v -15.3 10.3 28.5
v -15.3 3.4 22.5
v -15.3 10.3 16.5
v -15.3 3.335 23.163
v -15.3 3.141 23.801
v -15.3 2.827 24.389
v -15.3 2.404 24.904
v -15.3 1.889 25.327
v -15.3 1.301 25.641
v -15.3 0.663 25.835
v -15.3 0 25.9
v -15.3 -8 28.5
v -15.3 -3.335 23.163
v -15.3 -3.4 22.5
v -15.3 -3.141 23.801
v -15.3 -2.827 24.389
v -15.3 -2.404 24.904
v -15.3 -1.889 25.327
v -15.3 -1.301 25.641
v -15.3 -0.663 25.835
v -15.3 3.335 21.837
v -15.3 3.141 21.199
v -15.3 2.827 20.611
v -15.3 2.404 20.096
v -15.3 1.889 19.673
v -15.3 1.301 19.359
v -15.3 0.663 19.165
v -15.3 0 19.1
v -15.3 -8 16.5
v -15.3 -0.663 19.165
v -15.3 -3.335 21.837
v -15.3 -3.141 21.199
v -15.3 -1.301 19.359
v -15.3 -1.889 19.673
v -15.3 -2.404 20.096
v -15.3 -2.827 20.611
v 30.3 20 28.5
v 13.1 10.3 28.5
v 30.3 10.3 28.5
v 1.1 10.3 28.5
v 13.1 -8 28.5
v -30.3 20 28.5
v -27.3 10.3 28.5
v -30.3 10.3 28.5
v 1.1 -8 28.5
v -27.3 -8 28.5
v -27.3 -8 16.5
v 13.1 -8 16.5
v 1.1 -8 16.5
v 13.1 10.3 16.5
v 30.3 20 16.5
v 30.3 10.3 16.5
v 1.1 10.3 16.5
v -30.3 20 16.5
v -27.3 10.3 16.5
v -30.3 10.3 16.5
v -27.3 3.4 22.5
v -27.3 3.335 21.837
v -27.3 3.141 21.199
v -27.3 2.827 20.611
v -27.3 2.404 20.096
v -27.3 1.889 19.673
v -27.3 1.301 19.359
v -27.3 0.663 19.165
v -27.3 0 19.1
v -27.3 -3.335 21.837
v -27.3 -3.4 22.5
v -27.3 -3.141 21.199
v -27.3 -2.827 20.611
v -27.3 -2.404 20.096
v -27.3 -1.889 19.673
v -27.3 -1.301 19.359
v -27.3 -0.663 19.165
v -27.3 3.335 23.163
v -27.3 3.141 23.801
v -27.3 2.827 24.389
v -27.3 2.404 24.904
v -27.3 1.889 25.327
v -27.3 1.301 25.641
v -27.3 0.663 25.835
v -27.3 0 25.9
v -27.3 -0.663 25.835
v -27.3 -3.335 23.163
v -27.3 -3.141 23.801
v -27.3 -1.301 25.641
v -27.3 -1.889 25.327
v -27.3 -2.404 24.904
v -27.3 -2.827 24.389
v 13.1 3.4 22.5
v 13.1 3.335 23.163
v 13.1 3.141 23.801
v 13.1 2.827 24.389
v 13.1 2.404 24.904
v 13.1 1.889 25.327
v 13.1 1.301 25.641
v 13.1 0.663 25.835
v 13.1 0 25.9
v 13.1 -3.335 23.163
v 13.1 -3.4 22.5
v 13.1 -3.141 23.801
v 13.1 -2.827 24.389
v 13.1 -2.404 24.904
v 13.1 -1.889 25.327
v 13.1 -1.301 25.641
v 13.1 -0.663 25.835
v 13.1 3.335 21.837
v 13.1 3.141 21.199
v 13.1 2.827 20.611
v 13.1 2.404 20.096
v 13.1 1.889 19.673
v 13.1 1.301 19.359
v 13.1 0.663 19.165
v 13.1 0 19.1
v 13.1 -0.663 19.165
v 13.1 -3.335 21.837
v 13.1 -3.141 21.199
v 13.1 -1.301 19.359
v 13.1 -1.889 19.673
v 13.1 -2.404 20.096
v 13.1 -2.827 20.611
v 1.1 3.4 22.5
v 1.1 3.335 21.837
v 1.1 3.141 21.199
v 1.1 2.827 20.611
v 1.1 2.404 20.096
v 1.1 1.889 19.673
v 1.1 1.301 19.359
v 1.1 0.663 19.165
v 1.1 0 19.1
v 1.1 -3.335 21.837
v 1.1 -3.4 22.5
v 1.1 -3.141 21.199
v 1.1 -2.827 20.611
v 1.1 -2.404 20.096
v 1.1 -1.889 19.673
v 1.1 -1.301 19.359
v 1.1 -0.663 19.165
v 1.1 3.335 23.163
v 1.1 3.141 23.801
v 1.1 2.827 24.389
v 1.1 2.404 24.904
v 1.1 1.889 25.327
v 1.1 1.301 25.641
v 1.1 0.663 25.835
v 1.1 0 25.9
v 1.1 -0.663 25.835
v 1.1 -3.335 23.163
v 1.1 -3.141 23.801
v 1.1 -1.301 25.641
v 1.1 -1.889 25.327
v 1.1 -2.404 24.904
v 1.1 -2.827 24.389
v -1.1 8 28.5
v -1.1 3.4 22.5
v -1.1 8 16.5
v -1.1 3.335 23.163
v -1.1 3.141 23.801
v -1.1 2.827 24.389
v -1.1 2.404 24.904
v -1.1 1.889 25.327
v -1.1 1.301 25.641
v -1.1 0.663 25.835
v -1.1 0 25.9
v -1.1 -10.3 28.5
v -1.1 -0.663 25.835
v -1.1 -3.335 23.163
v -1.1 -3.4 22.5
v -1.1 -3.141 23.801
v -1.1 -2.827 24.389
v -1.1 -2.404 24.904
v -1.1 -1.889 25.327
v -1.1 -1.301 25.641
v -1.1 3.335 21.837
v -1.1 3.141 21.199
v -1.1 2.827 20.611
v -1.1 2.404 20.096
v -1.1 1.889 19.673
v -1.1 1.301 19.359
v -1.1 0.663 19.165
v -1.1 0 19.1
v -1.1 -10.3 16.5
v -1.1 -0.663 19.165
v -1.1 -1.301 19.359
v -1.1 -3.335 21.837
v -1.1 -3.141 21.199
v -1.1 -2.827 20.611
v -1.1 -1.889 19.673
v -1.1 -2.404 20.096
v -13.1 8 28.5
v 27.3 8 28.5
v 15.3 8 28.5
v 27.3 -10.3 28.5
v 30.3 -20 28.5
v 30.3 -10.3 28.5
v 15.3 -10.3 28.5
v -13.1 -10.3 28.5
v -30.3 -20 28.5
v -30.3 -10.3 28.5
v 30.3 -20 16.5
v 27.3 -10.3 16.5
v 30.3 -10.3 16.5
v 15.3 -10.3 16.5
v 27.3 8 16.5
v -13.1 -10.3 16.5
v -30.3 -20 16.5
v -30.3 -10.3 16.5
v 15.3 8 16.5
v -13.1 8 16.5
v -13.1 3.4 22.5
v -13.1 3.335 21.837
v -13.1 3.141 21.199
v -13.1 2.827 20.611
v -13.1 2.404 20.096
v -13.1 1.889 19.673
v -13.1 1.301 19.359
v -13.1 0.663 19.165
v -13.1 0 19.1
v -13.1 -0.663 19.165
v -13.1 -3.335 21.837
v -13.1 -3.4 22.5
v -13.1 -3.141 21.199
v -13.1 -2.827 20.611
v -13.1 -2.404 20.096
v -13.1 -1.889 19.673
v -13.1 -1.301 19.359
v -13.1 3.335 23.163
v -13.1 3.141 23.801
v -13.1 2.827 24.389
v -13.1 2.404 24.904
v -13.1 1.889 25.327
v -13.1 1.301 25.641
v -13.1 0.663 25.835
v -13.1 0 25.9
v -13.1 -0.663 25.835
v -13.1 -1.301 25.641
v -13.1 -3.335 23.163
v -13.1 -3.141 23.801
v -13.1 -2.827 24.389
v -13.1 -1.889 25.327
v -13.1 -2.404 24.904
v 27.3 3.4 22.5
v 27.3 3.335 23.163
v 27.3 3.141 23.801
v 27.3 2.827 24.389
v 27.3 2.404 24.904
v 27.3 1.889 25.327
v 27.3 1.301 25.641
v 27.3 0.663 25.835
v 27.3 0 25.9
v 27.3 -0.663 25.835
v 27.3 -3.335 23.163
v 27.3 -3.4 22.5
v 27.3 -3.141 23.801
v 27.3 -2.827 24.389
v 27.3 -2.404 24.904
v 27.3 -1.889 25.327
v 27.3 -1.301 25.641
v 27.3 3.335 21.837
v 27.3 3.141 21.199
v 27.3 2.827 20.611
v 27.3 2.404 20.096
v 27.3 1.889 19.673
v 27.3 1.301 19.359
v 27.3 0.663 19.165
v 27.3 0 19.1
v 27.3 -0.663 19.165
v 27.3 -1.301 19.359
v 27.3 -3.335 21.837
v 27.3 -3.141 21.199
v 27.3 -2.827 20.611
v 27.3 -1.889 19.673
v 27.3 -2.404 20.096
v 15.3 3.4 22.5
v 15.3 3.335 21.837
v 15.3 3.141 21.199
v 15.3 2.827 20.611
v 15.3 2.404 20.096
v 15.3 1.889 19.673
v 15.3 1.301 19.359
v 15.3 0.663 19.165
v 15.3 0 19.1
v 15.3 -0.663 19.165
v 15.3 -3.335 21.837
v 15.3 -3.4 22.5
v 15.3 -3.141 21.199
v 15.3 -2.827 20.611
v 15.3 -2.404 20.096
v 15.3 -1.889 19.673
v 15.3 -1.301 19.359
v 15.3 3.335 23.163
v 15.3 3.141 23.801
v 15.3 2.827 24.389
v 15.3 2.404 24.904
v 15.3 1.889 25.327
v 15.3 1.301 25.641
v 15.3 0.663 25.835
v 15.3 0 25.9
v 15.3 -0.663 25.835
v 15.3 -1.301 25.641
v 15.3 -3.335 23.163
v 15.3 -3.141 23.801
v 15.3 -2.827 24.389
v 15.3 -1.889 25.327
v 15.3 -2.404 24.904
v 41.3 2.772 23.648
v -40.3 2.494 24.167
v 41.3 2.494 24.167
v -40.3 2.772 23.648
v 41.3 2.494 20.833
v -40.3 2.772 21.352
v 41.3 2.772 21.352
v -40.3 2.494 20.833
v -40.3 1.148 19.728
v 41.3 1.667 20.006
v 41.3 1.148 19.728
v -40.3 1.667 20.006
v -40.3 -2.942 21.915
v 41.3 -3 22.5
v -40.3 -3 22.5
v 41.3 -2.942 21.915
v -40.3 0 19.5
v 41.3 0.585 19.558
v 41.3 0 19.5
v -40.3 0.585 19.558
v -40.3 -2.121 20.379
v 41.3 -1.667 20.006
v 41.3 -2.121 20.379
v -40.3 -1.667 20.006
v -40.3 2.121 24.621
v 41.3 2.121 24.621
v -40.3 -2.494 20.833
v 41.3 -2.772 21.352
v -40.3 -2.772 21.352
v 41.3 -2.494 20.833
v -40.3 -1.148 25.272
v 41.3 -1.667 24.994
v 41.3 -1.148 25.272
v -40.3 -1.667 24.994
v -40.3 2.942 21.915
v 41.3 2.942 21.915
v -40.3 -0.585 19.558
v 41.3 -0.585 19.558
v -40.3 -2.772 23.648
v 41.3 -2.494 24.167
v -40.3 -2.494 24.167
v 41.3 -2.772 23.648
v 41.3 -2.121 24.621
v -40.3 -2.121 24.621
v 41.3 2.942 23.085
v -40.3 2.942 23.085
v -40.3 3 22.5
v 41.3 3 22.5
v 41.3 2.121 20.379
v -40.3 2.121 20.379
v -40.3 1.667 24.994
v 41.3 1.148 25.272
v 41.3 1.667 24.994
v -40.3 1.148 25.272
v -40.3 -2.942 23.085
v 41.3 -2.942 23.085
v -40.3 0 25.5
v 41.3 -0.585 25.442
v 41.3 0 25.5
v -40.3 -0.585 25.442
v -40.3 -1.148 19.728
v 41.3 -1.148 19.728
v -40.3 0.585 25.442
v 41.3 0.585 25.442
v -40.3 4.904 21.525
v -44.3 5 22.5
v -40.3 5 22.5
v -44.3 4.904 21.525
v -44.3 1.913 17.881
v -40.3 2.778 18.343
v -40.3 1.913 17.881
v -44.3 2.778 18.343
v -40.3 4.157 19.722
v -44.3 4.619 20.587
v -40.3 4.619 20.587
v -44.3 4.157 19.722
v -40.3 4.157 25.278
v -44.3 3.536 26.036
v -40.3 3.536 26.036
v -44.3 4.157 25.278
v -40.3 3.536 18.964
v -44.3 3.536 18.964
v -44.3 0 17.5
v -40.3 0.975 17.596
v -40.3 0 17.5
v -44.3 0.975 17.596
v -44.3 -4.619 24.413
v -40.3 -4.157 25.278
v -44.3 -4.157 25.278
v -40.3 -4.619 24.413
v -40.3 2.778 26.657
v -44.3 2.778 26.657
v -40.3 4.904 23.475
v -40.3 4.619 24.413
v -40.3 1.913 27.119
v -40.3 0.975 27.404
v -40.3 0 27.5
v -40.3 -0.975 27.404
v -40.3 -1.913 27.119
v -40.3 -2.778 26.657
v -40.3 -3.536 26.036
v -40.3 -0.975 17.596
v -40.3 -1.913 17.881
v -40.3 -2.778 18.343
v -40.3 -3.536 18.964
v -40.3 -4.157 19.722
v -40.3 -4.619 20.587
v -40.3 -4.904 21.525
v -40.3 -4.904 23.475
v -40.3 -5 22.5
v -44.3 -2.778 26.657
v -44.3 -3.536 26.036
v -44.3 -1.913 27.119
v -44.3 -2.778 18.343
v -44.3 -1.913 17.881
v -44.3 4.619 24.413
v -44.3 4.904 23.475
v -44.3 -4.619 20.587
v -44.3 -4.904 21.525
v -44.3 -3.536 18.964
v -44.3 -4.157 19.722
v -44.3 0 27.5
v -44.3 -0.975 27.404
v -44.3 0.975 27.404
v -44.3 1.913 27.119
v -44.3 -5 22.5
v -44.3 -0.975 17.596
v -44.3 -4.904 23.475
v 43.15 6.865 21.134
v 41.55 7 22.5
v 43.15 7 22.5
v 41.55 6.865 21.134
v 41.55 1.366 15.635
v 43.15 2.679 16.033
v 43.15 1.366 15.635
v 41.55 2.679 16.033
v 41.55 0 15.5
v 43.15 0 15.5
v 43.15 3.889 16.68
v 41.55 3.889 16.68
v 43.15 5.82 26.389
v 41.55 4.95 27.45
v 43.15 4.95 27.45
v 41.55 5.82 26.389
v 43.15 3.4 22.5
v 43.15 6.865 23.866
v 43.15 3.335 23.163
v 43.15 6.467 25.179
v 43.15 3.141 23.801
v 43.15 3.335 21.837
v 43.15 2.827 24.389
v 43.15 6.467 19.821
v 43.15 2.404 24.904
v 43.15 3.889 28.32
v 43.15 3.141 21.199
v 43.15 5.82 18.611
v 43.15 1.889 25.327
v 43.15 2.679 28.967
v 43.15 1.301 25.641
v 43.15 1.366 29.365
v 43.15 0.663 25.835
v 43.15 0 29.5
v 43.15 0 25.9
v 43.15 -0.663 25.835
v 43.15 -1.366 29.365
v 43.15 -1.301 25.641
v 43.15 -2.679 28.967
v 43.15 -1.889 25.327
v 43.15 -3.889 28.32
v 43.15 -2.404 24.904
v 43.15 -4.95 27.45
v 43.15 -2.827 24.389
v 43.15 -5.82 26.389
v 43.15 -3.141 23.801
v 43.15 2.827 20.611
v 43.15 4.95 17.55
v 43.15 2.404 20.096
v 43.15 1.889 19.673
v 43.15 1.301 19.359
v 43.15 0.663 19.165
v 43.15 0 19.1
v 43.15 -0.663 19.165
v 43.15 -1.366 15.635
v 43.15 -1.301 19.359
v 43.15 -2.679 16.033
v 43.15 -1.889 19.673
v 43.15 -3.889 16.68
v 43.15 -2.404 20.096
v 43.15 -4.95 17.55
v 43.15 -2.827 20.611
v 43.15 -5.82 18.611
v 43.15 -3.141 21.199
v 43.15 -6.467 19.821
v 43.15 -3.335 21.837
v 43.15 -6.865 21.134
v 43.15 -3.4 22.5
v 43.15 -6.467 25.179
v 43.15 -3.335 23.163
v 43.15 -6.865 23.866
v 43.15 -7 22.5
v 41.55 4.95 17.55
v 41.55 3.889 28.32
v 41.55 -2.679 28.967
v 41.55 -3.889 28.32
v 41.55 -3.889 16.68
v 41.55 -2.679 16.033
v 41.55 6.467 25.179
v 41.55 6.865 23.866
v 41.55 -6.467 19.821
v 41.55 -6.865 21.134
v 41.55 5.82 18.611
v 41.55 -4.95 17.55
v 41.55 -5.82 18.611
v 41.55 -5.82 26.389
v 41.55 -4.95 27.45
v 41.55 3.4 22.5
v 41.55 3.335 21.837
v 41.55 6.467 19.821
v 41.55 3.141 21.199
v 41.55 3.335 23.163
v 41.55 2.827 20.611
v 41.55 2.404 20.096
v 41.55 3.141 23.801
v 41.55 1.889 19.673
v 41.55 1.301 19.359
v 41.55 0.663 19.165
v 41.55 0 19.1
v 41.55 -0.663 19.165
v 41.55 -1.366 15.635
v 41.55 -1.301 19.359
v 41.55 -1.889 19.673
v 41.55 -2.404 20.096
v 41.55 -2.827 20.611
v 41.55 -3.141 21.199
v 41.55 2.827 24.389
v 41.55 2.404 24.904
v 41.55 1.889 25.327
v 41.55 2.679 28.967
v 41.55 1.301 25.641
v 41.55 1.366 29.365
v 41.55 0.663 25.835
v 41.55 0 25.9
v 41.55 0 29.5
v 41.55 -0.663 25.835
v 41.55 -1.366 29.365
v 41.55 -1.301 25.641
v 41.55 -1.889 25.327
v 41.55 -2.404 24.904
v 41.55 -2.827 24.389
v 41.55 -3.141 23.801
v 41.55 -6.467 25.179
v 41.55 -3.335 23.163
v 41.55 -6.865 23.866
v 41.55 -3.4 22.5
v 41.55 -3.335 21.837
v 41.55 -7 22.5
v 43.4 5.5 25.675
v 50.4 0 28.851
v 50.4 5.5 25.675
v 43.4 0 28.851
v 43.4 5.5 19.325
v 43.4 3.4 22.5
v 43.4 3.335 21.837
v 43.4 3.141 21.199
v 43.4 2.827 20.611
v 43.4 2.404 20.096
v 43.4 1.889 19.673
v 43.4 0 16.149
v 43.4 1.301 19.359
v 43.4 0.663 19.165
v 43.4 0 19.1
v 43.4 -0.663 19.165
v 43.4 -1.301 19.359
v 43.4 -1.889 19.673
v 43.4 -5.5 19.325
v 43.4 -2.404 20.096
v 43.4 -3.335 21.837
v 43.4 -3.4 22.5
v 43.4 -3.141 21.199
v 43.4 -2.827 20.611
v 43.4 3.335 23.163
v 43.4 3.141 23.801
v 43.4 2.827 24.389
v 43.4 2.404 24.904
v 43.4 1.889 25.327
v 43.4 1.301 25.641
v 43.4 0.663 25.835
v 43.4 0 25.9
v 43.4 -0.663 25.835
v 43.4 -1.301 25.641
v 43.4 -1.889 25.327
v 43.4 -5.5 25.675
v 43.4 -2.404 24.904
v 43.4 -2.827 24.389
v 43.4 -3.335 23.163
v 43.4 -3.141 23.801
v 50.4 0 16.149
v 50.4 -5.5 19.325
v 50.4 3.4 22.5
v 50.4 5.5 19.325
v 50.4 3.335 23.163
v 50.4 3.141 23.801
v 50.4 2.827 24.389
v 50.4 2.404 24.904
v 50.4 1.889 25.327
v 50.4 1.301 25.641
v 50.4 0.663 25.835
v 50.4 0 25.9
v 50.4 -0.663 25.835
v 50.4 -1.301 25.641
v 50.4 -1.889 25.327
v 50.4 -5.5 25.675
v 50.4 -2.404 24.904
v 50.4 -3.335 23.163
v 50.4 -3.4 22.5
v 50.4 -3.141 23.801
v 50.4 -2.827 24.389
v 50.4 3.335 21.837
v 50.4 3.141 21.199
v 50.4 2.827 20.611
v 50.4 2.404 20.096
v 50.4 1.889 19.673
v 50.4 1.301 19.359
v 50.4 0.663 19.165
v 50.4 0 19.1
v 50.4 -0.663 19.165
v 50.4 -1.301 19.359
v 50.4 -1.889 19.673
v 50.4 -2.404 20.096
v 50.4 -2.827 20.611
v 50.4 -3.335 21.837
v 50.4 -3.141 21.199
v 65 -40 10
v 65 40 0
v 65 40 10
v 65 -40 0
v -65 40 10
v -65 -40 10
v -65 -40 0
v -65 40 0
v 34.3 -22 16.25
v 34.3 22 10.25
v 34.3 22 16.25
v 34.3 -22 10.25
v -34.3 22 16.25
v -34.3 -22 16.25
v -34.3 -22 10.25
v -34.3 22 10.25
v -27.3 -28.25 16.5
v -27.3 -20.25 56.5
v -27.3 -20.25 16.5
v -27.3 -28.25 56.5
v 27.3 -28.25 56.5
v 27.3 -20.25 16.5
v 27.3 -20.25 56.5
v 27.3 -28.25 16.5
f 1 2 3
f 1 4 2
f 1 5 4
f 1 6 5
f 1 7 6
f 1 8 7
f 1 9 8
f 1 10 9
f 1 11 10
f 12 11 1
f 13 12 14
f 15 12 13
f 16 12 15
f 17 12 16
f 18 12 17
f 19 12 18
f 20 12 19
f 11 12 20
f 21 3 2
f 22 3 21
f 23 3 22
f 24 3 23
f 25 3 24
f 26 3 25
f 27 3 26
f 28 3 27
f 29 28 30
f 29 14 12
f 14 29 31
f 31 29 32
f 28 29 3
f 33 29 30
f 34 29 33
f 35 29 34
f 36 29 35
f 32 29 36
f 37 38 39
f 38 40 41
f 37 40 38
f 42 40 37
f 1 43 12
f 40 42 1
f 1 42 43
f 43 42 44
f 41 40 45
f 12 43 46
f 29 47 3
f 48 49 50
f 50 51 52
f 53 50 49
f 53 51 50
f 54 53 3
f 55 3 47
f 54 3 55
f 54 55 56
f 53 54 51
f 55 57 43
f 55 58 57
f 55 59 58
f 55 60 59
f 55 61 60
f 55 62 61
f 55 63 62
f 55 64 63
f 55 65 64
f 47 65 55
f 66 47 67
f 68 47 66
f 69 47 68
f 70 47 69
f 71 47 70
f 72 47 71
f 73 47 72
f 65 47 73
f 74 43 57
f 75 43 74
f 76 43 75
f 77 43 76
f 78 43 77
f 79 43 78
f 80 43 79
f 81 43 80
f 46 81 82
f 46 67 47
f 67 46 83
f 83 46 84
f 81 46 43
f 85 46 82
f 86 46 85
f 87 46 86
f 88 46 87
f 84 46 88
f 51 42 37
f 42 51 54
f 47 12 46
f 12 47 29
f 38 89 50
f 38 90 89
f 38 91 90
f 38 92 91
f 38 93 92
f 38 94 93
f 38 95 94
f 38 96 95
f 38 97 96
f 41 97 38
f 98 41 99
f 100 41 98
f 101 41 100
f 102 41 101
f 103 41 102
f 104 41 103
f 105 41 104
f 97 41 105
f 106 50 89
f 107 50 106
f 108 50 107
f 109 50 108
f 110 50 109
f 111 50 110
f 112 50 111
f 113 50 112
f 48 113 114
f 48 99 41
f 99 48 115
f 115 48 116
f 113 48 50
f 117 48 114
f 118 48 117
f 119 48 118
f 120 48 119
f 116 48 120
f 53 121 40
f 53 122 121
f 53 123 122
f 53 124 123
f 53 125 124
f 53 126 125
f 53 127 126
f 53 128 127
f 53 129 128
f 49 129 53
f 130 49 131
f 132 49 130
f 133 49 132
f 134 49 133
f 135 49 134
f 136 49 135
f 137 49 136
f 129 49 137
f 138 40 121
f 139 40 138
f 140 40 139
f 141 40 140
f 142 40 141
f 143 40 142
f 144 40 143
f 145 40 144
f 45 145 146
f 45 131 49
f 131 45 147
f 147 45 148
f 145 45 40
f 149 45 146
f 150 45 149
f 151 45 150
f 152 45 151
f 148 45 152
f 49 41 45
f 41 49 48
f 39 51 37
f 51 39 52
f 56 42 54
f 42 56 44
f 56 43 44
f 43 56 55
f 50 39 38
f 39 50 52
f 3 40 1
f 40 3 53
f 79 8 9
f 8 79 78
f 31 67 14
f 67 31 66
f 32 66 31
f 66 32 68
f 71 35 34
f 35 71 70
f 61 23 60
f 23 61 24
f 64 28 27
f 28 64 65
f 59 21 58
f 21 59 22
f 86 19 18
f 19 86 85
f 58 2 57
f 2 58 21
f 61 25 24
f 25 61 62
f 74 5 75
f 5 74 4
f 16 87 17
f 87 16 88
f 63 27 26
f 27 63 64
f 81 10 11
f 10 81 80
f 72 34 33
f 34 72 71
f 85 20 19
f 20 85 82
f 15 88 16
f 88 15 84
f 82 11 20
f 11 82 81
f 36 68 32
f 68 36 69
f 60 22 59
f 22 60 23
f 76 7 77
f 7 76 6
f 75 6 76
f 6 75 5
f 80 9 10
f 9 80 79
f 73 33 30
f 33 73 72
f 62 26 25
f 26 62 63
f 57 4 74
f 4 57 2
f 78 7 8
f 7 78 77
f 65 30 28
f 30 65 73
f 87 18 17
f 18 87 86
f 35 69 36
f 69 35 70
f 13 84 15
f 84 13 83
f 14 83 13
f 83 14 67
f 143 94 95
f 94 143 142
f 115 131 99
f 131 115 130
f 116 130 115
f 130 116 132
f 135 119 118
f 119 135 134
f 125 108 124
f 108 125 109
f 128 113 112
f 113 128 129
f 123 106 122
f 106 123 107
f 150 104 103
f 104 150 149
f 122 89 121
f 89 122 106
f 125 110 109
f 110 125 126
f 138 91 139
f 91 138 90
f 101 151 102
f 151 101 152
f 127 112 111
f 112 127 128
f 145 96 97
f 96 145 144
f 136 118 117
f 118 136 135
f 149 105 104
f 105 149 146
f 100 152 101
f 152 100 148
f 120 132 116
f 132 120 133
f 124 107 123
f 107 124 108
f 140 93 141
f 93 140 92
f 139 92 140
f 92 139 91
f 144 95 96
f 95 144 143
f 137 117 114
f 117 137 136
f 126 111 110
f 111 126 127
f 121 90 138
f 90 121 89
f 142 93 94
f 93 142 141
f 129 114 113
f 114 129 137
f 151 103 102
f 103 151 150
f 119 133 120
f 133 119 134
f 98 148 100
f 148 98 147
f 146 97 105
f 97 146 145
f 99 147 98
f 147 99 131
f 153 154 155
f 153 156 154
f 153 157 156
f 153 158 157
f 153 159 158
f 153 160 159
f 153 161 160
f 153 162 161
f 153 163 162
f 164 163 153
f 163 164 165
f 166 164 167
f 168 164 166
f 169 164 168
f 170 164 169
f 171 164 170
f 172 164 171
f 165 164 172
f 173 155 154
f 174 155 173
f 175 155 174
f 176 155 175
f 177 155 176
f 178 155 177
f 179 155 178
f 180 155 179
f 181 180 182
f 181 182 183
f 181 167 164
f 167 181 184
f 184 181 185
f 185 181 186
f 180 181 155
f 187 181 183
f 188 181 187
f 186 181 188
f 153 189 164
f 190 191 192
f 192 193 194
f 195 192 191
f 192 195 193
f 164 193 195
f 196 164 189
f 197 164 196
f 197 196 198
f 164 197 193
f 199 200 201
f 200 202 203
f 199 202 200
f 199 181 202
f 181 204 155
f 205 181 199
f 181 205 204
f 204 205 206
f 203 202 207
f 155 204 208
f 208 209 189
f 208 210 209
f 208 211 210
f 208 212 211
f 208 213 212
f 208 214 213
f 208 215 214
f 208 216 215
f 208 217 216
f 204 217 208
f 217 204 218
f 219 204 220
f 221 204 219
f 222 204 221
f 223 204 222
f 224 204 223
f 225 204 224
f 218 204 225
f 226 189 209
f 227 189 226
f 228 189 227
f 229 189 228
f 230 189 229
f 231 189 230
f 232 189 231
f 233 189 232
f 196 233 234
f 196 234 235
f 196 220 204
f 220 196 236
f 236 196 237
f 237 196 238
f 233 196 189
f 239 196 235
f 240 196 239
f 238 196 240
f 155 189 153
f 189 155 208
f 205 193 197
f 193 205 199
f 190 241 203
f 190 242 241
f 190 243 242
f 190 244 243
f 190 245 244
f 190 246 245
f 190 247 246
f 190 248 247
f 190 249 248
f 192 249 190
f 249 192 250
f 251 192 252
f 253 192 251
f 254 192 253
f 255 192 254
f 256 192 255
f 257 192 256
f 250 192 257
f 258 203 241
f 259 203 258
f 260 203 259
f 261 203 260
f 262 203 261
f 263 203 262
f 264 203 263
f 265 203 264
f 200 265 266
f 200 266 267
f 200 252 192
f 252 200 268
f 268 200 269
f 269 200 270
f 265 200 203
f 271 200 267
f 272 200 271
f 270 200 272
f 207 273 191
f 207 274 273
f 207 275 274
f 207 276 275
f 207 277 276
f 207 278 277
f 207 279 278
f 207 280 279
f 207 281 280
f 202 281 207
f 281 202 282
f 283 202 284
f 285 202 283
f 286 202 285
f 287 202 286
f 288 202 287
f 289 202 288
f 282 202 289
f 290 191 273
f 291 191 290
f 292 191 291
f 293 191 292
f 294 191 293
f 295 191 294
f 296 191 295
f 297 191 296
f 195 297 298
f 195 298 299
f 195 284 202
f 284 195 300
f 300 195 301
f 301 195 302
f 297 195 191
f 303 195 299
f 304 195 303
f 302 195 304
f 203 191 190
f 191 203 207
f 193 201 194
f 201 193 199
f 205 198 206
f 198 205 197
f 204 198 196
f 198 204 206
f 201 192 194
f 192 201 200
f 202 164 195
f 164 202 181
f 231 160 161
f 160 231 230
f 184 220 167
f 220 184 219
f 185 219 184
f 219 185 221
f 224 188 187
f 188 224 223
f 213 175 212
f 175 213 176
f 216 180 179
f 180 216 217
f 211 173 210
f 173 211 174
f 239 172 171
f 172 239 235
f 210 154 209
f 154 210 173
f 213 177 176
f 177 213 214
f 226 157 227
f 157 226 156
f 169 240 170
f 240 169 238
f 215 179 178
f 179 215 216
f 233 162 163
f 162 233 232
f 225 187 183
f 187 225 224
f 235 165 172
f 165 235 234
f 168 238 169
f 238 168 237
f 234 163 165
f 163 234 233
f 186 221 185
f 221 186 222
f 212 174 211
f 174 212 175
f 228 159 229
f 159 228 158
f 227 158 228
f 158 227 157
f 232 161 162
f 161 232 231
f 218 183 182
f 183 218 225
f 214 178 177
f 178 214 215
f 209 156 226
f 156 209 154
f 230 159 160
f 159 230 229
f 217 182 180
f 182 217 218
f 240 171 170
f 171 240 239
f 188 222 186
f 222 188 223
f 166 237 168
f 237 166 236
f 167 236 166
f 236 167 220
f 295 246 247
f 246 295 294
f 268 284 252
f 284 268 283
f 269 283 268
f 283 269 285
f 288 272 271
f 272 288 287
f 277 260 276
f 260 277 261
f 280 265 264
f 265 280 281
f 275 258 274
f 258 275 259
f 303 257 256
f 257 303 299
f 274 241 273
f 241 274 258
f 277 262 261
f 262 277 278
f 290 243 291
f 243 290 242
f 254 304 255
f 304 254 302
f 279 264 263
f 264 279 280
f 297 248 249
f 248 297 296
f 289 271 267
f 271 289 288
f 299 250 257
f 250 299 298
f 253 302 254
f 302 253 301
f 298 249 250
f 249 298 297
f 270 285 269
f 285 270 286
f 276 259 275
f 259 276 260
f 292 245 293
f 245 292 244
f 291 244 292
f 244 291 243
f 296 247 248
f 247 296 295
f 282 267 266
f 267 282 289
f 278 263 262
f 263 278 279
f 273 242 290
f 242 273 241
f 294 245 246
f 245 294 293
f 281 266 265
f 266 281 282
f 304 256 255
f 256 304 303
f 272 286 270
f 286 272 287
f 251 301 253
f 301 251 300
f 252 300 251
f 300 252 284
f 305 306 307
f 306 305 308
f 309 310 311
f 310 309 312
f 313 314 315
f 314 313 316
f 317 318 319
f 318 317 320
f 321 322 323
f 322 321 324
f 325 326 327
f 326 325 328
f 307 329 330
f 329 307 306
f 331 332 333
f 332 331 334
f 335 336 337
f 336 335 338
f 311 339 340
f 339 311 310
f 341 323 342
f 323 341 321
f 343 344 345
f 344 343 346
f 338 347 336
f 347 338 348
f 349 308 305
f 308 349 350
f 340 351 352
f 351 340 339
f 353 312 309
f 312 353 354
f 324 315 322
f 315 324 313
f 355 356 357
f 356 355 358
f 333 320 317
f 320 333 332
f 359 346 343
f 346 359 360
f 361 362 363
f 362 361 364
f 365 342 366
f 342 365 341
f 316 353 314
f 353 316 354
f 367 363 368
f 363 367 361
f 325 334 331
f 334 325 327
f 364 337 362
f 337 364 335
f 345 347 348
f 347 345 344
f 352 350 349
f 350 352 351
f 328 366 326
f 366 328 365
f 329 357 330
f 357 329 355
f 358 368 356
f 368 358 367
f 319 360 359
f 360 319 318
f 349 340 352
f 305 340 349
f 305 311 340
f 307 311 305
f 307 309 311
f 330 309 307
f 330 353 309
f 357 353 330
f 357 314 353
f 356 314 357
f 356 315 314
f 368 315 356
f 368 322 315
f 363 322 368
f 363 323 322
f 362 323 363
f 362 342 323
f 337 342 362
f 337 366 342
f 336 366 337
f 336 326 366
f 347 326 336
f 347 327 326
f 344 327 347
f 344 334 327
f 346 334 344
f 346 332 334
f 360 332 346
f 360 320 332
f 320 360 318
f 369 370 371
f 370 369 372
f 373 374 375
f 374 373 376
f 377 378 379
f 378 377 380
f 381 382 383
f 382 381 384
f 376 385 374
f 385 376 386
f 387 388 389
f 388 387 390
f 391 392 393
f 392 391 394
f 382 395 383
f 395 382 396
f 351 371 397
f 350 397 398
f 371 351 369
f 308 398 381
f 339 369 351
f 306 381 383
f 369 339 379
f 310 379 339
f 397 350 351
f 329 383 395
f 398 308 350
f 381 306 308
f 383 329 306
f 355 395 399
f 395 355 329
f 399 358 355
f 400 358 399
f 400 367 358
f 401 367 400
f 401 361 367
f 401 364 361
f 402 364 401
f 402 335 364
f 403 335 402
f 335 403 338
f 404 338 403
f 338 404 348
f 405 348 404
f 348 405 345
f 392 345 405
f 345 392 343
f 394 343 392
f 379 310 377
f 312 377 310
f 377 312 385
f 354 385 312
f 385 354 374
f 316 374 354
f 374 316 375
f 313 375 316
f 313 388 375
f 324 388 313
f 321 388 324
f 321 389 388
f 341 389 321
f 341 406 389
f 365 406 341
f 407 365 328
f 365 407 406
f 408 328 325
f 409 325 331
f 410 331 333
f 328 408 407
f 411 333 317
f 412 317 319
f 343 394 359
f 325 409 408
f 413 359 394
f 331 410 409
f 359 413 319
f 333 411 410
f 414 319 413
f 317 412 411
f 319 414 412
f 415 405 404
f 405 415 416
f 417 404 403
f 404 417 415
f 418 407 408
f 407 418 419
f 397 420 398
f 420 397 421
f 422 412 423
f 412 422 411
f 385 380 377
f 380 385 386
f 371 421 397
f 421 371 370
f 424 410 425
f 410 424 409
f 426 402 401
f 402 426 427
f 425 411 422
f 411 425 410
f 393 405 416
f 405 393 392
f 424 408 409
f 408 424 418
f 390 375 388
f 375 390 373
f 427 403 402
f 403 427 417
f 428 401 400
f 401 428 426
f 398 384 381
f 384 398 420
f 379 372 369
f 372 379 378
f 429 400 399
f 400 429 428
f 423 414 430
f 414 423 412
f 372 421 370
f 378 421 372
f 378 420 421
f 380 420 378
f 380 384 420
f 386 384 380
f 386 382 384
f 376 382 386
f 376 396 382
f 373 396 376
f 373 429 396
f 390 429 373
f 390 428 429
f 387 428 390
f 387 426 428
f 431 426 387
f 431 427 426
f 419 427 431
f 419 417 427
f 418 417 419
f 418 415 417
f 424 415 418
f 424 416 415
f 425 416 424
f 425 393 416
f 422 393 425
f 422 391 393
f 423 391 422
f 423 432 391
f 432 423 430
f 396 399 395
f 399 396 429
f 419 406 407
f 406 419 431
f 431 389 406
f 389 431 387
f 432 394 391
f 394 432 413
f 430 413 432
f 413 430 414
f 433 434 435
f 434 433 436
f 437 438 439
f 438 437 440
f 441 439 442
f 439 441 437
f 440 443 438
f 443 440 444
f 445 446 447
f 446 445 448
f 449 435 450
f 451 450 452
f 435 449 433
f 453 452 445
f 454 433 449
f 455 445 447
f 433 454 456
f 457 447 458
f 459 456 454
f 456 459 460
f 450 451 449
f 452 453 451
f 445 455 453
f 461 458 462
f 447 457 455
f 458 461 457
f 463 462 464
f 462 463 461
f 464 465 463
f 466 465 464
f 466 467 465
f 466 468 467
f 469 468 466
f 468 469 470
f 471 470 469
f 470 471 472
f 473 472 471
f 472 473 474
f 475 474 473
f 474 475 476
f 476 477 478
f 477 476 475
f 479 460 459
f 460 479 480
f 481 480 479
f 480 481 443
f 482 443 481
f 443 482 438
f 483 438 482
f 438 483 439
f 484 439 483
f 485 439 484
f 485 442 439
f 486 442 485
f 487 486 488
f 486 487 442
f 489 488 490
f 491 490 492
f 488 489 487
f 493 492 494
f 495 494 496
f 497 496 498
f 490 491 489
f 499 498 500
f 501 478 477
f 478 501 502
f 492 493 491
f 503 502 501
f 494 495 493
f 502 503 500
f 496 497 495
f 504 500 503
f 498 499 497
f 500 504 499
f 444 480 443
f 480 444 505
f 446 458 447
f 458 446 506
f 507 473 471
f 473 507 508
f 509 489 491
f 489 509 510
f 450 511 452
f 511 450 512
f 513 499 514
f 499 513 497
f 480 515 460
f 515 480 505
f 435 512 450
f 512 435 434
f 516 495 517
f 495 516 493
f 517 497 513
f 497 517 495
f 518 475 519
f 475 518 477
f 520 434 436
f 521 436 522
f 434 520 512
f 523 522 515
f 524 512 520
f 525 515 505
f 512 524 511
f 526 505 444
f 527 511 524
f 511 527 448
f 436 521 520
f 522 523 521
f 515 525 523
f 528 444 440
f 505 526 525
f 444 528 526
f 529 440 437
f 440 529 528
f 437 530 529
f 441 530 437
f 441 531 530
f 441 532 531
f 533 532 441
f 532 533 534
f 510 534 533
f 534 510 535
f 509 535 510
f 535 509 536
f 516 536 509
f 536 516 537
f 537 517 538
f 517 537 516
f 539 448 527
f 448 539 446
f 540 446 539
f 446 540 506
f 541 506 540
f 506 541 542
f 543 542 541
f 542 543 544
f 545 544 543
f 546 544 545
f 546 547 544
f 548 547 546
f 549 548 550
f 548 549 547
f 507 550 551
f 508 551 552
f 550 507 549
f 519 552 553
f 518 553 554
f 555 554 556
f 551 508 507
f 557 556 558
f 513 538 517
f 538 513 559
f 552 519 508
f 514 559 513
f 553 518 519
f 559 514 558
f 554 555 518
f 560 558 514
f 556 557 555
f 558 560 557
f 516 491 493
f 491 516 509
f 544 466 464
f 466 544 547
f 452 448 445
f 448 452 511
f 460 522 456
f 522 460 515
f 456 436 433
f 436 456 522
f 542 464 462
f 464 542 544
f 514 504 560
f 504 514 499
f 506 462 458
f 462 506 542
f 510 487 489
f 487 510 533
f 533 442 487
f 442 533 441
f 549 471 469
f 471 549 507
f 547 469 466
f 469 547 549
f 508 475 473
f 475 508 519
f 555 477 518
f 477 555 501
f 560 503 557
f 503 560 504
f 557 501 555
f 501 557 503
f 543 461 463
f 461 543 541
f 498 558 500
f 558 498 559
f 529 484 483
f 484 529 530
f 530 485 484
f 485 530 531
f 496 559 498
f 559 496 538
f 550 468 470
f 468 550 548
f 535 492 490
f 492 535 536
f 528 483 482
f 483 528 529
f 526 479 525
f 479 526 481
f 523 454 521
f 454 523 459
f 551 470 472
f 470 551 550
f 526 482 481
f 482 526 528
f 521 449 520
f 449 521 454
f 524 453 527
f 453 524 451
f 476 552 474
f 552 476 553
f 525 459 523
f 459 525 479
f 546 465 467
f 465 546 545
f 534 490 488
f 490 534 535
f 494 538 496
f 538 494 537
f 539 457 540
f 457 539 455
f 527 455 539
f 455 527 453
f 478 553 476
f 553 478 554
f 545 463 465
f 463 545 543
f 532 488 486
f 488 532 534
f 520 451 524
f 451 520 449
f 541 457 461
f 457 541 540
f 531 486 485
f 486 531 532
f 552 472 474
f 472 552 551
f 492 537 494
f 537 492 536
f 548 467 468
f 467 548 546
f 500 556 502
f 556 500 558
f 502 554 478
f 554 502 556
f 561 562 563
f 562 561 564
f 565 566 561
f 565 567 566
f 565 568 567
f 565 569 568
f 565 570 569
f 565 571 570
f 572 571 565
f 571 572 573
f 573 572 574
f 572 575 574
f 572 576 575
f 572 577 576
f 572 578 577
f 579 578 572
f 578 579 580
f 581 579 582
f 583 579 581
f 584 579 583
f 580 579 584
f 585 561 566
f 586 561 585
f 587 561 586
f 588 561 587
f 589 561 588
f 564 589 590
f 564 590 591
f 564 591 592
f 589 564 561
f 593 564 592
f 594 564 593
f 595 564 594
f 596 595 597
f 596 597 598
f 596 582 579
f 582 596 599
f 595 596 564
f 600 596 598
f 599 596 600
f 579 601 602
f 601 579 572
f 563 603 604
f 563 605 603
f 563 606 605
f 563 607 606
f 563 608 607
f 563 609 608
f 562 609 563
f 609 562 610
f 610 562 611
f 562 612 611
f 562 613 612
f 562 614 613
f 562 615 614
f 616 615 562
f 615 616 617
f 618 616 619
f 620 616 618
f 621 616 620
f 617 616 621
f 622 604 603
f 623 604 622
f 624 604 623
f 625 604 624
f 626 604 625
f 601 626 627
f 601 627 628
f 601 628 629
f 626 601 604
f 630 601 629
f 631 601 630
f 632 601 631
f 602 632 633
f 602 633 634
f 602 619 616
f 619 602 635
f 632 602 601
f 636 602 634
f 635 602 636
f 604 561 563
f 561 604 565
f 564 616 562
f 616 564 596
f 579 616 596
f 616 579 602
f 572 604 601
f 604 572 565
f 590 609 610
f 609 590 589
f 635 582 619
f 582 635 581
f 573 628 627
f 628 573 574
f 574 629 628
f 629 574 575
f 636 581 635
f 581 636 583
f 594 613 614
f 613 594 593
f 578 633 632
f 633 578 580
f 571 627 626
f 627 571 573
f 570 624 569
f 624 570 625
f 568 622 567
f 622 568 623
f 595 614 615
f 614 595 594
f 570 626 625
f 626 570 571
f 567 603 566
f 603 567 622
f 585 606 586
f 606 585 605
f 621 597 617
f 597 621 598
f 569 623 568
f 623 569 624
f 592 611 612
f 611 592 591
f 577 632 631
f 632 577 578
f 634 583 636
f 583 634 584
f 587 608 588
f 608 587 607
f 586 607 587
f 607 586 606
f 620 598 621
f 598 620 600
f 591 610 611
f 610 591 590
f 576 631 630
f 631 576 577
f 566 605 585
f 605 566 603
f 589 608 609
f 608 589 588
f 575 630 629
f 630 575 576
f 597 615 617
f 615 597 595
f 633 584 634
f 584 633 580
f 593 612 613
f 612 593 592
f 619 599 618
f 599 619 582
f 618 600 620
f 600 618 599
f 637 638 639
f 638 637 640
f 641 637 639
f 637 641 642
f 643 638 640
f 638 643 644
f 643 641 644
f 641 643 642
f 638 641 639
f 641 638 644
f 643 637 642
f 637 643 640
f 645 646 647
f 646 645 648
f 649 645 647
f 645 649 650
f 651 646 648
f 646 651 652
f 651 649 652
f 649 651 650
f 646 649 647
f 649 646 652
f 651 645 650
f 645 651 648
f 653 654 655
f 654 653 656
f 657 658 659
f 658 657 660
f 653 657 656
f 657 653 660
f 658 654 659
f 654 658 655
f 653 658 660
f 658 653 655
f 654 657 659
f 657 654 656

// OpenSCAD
$fn = 32;

// ------------------------------------------------------------------------
// Comb hinge with flap: leaf 60.6 x 20 mm, pin d6, flap 40 mm
// Every part is its own module, assembly() places every instance.
// ------------------------------------------------------------------------

// --- part 1 ---
module hinge_bed() {
  difference() {
    translate([-65, -40, 0]) cube([130, 80, 10]);
  }
}

// --- part 2 ---
module hinge_riser() {
  difference() {
    translate([-34.3, -22, 0]) cube([68.6, 44, 6]);
  }
}

// --- part 3 ---
module hinge_leaf_a() {
  difference() {
    union() {
      translate([-27.3, -8, -6]) cube([12, 28, 12]);
      translate([1.1, -8, -6]) cube([12, 28, 12]);
      translate([-30.3, 10.3, -6]) cube([60.6, 9.7, 12]);
    }
    translate([-21.3, 0, 0]) rotate([0, 90, 0]) cylinder(h = 14, d = 6.8, center = true);
    translate([7.1, 0, 0]) rotate([0, 90, 0]) cylinder(h = 14, d = 6.8, center = true);
  }
}

// --- part 4 ---
module hinge_leaf_b() {
  difference() {
    union() {
      translate([-13.1, -20, -6]) cube([12, 28, 12]);
      translate([15.3, -20, -6]) cube([12, 28, 12]);
      translate([-30.3, -20, -6]) cube([60.6, 9.7, 12]);
    }
    translate([-7.1, 0, 0]) rotate([0, 90, 0]) cylinder(h = 14, d = 6.8, center = true);
    translate([21.3, 0, 0]) rotate([0, 90, 0]) cylinder(h = 14, d = 6.8, center = true);
  }
}

// --- part 5 ---
module hinge_flap() {
  difference() {
    translate([-27.3, -20, 0]) cube([54.6, 40, 8]);
  }
}

// --- part 6 ---
module hinge_pin() {
  rotate([0, 90, 0]) cylinder(h = 82.6, d = 6, center = true);
  translate([-44.3, 0, 0]) rotate([0, 90, 0]) cylinder(h = 4, d = 10);
}

// --- part 7 ---
module pin_washer() {
  difference() {
      translate([0, 0, 0]) cylinder(h = 1.6, d = 14);
      translate([0, 0, -1]) cylinder(h = 3.6, d = 6.8);
    }
}

// --- part 8 ---
module pin_nut() {
  difference() {
    linear_extrude(height = 7) polygon(points = [[6.351, 0], [3.175, 5.5], [-3.175, 5.5], [-6.351, 0], [-3.175, -5.5], [3.175, -5.5]]);
    translate([0, 0, -1]) cylinder(h = 9, d = 6.8);
  }
}

// --- assembly ---
module assembly() {
  color([0.80, 0.24, 0.20]) translate([0, 0, 0]) rotate([0, 0, 0]) hinge_bed();
  color([0.20, 0.45, 0.75]) translate([0, 0, 10.25]) rotate([0, 0, 0]) hinge_riser();
  color([0.25, 0.62, 0.32]) translate([0, 0, 22.5]) rotate([0, 0, 0]) hinge_leaf_a();
  color([0.92, 0.70, 0.18]) translate([0, 0, 22.5]) rotate([0, 0, 0]) hinge_leaf_b();
  color([0.58, 0.35, 0.70]) translate([0, -20.25, 36.5]) rotate([90, 0, 0]) hinge_flap();
  color([0.16, 0.66, 0.66]) translate([0, 0, 22.5]) rotate([0, 0, 0]) hinge_pin();
  color([0.85, 0.48, 0.18]) translate([41.55, 0, 22.5]) rotate([0, 90, 0]) pin_washer();
  color([0.55, 0.60, 0.65]) translate([43.4, 0, 22.5]) rotate([0, 90, 0]) pin_nut();
}

assembly();
